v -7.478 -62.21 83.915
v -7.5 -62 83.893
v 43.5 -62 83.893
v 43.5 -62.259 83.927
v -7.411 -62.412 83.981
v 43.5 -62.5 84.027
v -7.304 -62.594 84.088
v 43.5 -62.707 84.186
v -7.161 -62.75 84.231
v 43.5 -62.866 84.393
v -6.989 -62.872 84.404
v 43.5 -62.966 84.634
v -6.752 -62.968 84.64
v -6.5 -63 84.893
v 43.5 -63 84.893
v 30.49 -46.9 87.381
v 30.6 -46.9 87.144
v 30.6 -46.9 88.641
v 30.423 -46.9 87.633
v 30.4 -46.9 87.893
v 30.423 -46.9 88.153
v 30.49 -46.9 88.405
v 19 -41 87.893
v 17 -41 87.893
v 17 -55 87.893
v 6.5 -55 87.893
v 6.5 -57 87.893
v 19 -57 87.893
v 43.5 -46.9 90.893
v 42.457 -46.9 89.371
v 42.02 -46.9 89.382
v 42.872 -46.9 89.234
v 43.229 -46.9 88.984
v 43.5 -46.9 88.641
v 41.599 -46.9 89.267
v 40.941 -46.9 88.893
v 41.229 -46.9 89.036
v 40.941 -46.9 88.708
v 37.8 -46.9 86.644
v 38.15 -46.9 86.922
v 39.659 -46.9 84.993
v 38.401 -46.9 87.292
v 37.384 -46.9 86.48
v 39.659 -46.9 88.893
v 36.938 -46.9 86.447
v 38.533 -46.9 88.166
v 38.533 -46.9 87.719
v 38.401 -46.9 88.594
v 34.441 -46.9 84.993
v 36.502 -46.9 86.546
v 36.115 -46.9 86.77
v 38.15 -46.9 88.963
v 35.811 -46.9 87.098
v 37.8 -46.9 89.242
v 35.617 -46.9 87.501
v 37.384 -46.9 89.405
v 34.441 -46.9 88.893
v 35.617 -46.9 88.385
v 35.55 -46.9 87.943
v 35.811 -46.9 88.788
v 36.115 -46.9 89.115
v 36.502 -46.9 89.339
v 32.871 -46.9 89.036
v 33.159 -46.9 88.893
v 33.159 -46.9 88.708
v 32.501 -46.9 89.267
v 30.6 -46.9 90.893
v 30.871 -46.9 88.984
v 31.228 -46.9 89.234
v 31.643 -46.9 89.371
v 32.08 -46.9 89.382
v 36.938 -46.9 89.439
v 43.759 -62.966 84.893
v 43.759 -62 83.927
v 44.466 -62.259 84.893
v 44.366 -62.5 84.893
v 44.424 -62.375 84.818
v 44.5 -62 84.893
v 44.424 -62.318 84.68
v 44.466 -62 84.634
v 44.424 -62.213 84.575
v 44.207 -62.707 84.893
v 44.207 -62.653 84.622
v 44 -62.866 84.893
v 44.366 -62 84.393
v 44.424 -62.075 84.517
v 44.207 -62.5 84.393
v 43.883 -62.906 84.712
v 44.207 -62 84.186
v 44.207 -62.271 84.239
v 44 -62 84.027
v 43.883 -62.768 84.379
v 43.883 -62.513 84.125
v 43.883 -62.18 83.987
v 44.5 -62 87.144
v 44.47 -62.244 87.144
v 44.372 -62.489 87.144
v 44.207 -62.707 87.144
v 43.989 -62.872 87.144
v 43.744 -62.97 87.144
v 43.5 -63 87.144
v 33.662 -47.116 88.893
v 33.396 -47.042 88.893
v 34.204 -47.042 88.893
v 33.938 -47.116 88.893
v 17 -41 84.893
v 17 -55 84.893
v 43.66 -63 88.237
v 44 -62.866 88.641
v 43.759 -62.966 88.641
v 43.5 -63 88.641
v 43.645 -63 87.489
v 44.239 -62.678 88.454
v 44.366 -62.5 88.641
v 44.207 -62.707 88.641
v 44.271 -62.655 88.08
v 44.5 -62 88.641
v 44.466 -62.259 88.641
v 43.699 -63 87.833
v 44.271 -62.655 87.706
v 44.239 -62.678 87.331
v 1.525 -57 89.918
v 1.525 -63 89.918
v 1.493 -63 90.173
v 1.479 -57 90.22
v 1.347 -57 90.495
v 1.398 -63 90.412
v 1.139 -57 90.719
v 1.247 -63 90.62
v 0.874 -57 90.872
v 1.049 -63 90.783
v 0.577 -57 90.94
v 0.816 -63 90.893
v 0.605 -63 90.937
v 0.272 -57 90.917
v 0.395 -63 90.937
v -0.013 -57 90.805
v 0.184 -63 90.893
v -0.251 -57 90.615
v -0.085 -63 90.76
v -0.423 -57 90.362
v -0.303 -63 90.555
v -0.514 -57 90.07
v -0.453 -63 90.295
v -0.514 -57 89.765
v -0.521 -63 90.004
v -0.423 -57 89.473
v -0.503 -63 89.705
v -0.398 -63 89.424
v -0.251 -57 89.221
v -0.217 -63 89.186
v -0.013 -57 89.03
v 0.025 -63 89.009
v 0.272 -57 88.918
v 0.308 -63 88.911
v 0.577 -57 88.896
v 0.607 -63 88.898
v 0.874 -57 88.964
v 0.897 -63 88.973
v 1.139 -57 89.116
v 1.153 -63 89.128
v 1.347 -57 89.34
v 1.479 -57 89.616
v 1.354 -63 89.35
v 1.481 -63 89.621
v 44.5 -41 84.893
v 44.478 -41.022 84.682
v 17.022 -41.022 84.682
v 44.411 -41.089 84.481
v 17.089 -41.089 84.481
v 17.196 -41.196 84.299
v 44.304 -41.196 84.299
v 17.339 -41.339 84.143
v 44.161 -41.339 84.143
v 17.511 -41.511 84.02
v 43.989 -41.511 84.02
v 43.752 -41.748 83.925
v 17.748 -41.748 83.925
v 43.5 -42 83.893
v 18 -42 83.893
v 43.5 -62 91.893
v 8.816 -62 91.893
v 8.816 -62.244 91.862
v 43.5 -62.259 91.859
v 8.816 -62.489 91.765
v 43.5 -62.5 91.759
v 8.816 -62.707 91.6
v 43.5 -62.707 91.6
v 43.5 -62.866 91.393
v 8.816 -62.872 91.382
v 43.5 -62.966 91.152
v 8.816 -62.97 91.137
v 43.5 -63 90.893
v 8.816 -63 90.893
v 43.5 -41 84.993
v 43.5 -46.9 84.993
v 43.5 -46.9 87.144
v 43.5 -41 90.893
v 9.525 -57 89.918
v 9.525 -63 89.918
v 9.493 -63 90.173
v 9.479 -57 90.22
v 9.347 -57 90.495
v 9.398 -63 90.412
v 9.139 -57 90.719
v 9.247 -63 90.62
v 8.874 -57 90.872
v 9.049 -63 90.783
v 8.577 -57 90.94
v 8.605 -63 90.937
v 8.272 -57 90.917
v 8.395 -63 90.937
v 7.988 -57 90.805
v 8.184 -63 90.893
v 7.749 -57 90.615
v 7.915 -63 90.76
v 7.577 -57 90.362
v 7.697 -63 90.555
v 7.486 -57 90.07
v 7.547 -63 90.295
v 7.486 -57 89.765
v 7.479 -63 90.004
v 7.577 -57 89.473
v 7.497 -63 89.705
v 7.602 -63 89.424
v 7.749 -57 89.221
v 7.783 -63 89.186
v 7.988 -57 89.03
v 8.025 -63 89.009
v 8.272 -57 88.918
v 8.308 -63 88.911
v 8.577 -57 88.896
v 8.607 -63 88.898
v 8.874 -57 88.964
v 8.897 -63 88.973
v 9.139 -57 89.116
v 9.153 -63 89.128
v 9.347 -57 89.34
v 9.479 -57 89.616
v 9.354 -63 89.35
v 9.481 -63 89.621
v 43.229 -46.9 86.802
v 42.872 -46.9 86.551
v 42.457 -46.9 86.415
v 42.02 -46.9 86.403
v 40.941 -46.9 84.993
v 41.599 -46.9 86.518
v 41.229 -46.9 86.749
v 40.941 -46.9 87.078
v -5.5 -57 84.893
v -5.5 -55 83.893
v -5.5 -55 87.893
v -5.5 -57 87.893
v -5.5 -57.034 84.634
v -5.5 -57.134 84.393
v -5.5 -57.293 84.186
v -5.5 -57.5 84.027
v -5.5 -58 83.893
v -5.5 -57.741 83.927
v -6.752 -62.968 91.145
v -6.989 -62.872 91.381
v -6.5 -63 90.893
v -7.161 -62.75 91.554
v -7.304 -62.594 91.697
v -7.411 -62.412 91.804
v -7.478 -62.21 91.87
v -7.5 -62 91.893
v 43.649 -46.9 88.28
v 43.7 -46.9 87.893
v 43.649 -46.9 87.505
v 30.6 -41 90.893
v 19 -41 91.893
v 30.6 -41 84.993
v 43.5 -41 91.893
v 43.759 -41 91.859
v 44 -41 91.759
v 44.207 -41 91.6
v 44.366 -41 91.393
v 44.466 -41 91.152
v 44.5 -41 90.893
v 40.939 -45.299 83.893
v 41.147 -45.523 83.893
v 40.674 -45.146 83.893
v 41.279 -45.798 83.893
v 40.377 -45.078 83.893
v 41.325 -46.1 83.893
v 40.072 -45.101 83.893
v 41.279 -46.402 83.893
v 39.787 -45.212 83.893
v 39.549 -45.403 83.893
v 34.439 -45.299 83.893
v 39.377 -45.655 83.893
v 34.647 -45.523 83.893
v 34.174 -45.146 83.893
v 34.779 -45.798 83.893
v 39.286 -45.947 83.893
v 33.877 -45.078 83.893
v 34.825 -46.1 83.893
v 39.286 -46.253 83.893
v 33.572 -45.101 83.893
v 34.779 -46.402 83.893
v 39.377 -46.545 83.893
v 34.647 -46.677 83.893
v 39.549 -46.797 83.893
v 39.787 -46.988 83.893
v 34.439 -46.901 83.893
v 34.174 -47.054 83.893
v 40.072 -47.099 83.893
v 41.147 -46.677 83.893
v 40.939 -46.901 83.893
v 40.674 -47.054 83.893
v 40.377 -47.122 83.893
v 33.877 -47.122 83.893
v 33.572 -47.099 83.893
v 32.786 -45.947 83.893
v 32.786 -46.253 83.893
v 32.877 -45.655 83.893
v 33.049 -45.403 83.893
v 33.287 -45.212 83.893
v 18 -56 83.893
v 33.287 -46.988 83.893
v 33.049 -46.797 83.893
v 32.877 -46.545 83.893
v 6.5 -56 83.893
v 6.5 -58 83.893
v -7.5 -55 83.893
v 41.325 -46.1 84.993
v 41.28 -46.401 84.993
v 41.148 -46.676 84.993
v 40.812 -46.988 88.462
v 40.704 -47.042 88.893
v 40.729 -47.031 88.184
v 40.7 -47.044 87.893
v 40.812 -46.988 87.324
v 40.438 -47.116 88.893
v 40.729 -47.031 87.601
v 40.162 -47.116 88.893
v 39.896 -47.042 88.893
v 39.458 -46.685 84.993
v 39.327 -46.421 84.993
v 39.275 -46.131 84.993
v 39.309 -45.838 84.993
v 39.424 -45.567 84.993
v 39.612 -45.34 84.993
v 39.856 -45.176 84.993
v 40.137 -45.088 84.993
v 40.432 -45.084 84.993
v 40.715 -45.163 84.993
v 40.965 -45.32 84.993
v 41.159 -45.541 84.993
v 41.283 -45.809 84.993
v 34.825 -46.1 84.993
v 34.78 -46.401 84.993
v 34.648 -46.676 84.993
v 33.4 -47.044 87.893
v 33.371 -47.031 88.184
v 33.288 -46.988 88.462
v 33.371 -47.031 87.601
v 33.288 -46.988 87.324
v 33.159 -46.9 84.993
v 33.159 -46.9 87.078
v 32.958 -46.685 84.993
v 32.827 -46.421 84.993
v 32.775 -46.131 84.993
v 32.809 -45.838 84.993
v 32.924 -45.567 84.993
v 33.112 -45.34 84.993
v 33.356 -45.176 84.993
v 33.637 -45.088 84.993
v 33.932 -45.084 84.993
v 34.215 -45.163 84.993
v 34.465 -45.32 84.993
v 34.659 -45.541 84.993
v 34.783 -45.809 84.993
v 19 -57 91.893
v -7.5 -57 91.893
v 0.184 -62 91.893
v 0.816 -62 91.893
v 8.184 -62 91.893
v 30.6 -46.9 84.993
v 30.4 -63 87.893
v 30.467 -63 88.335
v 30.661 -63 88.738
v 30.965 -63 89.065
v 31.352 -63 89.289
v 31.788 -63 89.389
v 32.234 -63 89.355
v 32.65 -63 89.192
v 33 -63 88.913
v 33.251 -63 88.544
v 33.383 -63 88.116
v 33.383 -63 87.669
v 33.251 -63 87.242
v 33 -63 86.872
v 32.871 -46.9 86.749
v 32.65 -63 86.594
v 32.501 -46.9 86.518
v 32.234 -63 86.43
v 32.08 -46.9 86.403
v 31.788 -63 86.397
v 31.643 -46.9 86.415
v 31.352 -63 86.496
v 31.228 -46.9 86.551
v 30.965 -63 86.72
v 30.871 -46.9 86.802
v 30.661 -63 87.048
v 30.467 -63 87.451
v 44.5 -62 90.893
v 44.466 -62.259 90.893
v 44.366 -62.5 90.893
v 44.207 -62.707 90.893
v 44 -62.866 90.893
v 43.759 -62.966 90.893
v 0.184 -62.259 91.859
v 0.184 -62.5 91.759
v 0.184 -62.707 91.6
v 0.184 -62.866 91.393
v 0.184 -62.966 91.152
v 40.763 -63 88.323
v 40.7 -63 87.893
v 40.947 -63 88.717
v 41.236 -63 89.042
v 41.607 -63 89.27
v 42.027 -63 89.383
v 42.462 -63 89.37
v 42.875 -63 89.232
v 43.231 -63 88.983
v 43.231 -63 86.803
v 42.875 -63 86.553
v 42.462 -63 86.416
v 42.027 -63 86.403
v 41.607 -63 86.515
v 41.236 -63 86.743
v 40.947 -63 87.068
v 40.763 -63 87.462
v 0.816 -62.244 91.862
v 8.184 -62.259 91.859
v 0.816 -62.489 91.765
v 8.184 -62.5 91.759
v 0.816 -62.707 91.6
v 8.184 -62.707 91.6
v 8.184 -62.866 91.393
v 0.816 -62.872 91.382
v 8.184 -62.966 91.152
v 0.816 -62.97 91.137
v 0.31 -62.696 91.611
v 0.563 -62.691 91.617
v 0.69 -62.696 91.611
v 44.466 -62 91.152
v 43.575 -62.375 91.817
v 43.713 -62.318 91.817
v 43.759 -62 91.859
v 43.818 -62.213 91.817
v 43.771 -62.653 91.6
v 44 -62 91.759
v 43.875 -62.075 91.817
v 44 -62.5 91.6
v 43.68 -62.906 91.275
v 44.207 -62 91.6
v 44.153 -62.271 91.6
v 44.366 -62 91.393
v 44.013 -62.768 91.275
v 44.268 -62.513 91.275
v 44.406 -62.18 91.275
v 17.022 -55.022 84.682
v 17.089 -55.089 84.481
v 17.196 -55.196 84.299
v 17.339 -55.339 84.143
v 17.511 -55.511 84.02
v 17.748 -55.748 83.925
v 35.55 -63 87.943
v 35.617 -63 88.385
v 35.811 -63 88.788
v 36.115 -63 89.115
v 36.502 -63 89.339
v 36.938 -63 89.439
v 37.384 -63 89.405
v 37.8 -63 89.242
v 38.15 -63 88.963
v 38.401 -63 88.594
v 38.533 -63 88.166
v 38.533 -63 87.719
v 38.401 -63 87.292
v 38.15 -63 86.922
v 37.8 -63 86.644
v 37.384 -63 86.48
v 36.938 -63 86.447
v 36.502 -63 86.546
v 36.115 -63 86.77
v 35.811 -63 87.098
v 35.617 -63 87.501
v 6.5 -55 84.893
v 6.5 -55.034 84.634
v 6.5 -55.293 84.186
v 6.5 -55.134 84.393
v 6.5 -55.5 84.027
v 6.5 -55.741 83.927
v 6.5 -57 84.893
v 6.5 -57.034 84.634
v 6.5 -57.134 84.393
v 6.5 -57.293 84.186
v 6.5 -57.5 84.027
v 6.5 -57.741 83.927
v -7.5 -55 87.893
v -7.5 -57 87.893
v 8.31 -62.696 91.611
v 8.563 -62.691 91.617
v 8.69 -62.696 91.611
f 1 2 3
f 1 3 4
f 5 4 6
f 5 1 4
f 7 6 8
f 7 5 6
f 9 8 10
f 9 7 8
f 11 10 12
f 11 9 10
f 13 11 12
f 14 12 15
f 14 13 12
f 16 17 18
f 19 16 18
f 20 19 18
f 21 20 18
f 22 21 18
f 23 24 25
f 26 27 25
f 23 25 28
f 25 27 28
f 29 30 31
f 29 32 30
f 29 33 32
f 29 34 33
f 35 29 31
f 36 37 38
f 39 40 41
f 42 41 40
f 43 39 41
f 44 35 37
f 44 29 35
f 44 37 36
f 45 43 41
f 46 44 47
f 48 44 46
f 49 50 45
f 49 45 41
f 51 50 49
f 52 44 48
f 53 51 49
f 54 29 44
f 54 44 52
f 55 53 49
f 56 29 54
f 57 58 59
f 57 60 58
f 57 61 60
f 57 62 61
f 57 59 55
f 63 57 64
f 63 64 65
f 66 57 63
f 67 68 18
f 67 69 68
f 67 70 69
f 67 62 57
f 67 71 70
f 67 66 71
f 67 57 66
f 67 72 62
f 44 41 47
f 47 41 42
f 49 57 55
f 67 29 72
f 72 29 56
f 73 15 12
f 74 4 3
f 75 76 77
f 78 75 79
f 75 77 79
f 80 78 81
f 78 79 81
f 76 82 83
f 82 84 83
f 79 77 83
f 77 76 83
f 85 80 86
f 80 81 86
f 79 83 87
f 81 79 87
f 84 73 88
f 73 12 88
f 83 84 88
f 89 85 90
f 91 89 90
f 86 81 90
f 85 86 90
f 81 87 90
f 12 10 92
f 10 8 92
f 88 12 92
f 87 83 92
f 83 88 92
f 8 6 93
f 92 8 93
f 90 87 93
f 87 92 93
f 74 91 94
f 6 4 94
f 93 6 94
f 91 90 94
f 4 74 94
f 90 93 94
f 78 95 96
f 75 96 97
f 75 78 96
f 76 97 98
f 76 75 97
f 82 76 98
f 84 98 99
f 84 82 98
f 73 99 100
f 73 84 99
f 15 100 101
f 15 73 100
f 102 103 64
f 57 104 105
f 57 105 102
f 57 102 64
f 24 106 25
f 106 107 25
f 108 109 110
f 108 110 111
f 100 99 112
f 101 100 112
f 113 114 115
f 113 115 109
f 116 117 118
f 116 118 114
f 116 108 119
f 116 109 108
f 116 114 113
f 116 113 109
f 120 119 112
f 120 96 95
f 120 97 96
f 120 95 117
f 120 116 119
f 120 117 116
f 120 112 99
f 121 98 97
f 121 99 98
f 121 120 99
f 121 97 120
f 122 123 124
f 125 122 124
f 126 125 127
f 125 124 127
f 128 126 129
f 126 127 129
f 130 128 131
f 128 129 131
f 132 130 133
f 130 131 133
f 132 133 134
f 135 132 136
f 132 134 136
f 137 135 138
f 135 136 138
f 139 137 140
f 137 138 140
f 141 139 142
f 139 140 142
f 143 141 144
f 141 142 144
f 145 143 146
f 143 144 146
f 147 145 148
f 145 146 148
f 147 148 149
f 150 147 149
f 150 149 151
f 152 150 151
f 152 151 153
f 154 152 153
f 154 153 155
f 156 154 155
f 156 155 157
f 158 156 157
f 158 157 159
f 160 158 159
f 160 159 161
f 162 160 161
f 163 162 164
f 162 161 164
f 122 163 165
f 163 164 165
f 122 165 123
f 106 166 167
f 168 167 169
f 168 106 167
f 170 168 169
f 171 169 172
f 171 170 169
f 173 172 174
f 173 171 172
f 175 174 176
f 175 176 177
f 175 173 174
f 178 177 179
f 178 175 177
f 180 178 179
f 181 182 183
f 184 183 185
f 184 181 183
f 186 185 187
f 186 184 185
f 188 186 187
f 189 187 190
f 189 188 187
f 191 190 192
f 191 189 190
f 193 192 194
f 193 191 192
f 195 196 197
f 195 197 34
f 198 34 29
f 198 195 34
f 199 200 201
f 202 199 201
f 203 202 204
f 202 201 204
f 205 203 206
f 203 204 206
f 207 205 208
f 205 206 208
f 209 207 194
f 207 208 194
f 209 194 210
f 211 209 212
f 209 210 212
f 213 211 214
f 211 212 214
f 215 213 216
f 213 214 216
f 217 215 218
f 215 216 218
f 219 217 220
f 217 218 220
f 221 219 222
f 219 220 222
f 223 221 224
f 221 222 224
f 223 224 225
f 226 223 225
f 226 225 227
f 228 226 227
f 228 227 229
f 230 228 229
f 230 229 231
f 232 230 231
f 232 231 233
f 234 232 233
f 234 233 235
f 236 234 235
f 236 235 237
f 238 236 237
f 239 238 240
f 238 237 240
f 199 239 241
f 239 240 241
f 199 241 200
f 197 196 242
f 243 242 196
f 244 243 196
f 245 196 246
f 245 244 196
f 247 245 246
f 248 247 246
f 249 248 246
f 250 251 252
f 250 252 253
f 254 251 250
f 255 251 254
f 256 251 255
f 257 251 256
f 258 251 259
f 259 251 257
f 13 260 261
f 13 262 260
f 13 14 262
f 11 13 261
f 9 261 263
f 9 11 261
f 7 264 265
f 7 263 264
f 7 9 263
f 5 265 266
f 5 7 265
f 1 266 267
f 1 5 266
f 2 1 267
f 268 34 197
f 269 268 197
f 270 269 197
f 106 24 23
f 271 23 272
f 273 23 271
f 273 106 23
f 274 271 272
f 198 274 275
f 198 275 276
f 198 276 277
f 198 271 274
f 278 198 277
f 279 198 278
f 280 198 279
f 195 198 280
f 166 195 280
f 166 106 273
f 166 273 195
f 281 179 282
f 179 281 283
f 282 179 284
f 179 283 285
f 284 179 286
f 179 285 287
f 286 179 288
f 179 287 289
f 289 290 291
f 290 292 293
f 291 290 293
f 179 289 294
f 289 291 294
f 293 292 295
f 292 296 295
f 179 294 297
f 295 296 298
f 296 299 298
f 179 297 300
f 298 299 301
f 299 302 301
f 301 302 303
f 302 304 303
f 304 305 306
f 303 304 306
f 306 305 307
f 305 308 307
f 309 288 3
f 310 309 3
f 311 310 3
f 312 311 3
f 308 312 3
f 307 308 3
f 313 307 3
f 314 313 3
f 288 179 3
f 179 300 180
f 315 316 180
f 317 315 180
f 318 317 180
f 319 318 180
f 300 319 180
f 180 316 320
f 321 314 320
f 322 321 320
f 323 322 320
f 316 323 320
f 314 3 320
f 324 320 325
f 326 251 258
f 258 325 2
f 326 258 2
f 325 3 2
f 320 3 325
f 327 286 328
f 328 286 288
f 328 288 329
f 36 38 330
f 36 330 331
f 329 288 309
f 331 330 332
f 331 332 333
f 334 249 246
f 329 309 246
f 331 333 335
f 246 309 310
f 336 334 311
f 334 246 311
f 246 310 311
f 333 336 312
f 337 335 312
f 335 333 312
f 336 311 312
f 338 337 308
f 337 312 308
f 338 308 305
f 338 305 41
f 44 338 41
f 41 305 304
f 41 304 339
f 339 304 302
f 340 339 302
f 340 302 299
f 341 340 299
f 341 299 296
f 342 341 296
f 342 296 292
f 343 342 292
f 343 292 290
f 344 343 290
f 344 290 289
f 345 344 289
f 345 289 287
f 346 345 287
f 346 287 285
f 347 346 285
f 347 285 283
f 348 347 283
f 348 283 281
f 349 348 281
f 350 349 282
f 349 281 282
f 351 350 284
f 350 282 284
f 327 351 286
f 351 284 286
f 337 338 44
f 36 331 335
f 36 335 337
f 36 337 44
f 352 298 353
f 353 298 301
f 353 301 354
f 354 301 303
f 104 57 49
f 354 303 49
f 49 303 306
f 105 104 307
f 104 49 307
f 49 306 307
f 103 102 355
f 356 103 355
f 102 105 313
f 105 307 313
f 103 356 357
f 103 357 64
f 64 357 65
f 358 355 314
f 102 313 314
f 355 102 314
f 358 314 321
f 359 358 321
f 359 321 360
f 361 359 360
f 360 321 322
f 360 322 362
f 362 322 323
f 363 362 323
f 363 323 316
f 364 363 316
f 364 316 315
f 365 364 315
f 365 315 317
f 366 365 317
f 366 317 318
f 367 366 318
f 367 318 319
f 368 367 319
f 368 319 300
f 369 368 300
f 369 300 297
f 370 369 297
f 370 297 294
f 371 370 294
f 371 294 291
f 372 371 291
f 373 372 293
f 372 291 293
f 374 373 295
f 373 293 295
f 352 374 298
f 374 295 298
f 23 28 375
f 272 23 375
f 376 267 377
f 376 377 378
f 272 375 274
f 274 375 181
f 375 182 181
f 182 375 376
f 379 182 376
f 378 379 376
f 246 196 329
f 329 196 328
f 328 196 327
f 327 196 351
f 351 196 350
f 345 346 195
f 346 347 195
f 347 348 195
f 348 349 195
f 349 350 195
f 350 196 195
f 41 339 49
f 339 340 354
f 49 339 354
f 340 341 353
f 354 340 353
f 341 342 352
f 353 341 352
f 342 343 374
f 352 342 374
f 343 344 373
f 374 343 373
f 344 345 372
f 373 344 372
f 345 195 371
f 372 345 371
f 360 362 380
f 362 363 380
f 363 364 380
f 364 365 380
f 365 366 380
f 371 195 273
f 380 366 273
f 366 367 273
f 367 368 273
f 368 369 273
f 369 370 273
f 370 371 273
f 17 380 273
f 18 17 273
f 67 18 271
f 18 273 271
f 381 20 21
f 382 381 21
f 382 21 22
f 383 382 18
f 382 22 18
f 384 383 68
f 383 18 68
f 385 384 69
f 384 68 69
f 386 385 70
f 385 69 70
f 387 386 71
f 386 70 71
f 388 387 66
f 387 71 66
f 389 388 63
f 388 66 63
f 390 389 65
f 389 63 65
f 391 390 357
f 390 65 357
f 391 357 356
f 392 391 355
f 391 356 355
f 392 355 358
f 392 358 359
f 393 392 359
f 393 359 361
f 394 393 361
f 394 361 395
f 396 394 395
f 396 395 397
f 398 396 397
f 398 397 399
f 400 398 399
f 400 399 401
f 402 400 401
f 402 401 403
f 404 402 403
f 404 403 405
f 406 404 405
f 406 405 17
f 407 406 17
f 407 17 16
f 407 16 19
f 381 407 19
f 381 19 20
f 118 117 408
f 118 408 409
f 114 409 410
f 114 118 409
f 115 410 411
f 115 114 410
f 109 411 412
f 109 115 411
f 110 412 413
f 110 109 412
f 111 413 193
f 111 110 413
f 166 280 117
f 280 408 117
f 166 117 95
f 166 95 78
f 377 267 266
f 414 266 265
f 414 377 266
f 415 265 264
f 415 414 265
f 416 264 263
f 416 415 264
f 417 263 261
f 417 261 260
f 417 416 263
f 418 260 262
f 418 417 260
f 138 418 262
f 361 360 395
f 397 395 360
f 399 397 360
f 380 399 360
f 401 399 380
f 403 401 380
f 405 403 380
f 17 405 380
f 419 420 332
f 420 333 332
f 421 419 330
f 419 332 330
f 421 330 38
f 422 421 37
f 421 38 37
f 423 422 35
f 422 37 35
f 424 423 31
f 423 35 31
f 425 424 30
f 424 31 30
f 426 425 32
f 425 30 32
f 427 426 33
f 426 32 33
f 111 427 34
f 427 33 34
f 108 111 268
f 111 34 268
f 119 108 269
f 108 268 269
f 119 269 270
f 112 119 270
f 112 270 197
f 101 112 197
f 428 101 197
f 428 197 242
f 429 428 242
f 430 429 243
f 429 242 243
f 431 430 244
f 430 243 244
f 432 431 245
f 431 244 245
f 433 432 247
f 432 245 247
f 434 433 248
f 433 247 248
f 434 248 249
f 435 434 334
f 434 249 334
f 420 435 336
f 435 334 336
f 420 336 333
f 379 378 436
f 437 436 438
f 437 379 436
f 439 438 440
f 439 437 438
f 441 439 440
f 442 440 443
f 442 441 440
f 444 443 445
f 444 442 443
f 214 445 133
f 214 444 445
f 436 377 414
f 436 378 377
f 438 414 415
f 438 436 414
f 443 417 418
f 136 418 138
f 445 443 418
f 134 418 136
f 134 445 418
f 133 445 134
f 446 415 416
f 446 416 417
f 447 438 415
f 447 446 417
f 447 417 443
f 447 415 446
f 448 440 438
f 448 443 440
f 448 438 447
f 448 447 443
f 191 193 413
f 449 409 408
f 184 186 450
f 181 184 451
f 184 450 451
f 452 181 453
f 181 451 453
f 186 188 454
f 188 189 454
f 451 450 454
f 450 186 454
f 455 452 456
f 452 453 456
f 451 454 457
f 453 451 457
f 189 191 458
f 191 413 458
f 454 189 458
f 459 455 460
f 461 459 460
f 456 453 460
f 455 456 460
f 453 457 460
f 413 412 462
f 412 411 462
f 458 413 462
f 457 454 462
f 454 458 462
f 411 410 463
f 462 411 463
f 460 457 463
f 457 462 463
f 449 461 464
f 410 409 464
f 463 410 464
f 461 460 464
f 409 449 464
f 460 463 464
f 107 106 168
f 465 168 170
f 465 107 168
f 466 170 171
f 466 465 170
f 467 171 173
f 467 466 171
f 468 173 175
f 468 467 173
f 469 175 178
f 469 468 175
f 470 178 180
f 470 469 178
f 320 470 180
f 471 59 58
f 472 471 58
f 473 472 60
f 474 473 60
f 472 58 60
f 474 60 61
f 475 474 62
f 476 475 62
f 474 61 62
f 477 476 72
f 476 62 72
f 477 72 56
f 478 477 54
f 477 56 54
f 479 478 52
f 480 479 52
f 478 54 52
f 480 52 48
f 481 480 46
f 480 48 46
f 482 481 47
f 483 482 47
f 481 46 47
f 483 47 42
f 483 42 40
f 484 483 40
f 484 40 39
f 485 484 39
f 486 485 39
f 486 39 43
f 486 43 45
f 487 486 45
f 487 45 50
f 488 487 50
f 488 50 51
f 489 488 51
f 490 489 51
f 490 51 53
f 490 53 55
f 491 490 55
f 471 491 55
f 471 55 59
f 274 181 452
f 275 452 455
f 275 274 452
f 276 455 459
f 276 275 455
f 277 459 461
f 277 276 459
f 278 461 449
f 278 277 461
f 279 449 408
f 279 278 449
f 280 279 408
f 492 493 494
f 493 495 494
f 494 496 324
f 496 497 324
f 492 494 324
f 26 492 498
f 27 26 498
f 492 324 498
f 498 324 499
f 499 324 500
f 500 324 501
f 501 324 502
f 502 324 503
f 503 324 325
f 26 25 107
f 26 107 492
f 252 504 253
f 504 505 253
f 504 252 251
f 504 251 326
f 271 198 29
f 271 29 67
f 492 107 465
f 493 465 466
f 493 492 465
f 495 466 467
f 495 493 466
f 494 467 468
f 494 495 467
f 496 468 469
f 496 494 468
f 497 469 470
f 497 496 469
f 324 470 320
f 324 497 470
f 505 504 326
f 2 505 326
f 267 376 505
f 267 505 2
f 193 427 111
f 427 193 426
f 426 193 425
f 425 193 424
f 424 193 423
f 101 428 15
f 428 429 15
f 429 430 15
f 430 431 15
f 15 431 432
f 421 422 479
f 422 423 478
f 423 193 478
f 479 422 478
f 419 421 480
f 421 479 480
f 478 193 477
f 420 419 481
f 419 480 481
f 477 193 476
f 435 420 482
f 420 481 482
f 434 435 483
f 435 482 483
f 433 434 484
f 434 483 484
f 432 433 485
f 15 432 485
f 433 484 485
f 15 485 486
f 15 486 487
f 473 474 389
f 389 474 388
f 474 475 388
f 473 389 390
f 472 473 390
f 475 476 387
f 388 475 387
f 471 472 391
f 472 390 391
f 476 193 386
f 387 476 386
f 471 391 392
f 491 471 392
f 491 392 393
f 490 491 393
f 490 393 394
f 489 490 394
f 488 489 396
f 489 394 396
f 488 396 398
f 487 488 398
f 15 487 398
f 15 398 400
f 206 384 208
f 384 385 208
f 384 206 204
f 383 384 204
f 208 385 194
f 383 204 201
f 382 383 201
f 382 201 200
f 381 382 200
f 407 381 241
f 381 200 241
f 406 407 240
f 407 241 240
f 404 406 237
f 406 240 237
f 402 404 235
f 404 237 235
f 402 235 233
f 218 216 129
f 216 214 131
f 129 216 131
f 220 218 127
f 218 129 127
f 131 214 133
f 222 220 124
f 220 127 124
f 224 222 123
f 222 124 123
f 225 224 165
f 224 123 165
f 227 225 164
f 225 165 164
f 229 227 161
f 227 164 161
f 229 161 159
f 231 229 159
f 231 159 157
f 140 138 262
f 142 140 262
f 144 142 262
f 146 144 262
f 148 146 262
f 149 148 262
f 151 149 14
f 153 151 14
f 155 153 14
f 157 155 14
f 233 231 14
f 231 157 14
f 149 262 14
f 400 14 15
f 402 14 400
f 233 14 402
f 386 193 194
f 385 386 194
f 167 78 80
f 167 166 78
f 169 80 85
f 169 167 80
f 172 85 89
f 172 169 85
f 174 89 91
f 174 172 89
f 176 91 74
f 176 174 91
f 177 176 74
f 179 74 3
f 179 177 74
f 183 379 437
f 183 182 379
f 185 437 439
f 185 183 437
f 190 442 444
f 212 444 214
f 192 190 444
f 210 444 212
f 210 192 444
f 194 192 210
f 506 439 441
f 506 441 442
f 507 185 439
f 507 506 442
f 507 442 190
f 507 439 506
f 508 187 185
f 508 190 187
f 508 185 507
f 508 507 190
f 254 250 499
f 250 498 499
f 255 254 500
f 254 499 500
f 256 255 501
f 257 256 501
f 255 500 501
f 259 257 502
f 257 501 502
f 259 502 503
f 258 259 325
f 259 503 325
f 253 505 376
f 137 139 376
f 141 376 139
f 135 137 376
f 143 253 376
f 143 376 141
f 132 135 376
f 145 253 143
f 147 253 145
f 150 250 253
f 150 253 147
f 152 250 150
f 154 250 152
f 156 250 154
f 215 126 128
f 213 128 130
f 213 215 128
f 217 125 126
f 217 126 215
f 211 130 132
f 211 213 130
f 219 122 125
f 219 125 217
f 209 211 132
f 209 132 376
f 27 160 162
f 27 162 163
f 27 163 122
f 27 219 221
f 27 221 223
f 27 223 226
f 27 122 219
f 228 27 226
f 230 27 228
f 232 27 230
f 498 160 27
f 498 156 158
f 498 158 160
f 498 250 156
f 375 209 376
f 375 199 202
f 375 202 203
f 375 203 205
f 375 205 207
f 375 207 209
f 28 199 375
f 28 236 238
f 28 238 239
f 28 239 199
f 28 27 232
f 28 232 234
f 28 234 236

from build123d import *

# Parameters (mm, degrees)
PAD011_DEPTH    = 4
PAD012_DEPTH    = 4
PAD012_FACE11_W = 12
PAD012_FACE11_H = 8
PAD013_DEPTH    = 20
PAD014_DEPTH    = 10
SKETCH037_W     = 12
SKETCH037_H     = 2
POCKET014_DEPTH = 5
SKETCH038_W     = 12.9
SKETCH038_H     = 5.9
POCKET015_DEPTH = 5.9
SKETCH039_R     = 1.5
POCKET016_DEPTH = 20
SKETCH040_R     = 1.025
POCKET017_DEPTH = 5
SKETCH041_R     = 1.025
POCKET018_DEPTH = 20
FILLET002_R     = 1


with BuildPart() as part:
    # Sketch035 → Pad011 (new body)
    with BuildSketch(Plane.XY):
        Polygon((-7.5, -57), (19, -57), (19, -51), (24.5, -51), (24.5, -63), (-7.5, -63), align=None)
    extrude(amount=PAD011_DEPTH)

    # Sketch036 (on Face7 of Pad011) → Pad012 (join)
    with BuildSketch(Plane(origin=(0, 0, 0), x_dir=(1, 0, 0), z_dir=(0, 0, -1))):
        Polygon((-7.5, 63), (24.5, 63), (24.5, 51), (17, 51), (17, 55), (-7.5, 55), align=None)
    extrude(amount=PAD012_DEPTH)

    # Pad012 Face11 → Pad013 (add)
    with BuildSketch(Plane(origin=(24.5, -57, 0), x_dir=(0, -1, 0), z_dir=(1, 0, 0))):
        Rectangle(PAD012_FACE11_W, PAD012_FACE11_H)
    extrude(amount=PAD013_DEPTH)

    # Pad013 Face11 → Pad014 (add)
    with BuildSketch(Plane(origin=(31.231132, -51, -0.075472), x_dir=(1, 0, 0), z_dir=(0, 1, 0))):
        Polygon((-12.231132, -0.075472), (-12.231132, -4.075472), (13.268868, -4.075472), (13.268868, 3.924528), (-14.231132, 3.924528), (-14.231132, -0.075472), align=None)
    extrude(amount=PAD014_DEPTH)

    # Sketch037 (on Face9 of Pad014) → Pocket014 (cut)
    with BuildSketch(Plane(origin=(0, 0, -4), x_dir=(1, 0, 0), z_dir=(0, 0, -1))):
        with Locations((0.5, 56)):
            Rectangle(SKETCH037_W, SKETCH037_H)
    extrude(amount=-POCKET014_DEPTH, mode=Mode.SUBTRACT)

    # Sketch038 (on Face10 of Pocket014) → Pocket015 (cut)
    with BuildSketch(Plane(origin=(0, -41, 0), x_dir=(-1, 0, 0), z_dir=(0, 1, 0))):
        with Locations((-37.05, 0.05)):
            Rectangle(SKETCH038_W, SKETCH038_H)
    extrude(amount=-POCKET015_DEPTH, mode=Mode.SUBTRACT)

    # Sketch039 (on Face20 of Pocket015) → Pocket016 (cut)
    with BuildSketch(Plane(origin=(0, -46.9, 0), x_dir=(-1, 0, 0), z_dir=(0, 1, 0))):
        with Locations((-42.2, 0)):
            Circle(SKETCH039_R)
        with Locations((-37.05, 0.05)):
            Circle(SKETCH039_R)
        with Locations((-31.9, 0)):
            Circle(SKETCH039_R)
    extrude(amount=-POCKET016_DEPTH, mode=Mode.SUBTRACT)

    # Sketch040 (on Face8 of Pocket016) → Pocket017 (cut)
    with BuildSketch(Plane(origin=(0, 0, -4), x_dir=(1, 0, 0), z_dir=(0, 0, -1))):
        with Locations((40.3, 46.1)):
            Circle(SKETCH040_R)
        with Locations((33.8, 46.1)):
            Circle(SKETCH040_R)
    extrude(amount=-POCKET017_DEPTH, mode=Mode.SUBTRACT)

    # Sketch041 (on Face19 of Pocket017) → Pocket018 (cut)
    with BuildSketch(Plane.XZ.offset(63)):
        with Locations((0.5, 2.025)):
            Circle(SKETCH041_R)
        with Locations((8.5, 2.025)):
            Circle(SKETCH041_R)
    extrude(amount=-POCKET018_DEPTH, mode=Mode.SUBTRACT)

    # Fillet002
    fillet002_edges = [part.edges().sort_by_distance(p)[0] for p in [
        (18.5, -63, -4),
        (44.5, -63, 0),
        (18.5, -63, 4),
        (-7.5, -63, 0),
        (44.5, -52, -4),
        (0.5, -57, -4),
        (11.75, -55, -4),
        (17, -48, -4),
        (30.75, -41, -4),
        (44.5, -52, 4),
    ]]
    fillet(fillet002_edges, radius=FILLET002_R)


with BuildPart() as part_1:
    # Body002 placement: moved
    add(part.part.moved(Location((0, 0, 87.8927))))


solid = part_1.part
